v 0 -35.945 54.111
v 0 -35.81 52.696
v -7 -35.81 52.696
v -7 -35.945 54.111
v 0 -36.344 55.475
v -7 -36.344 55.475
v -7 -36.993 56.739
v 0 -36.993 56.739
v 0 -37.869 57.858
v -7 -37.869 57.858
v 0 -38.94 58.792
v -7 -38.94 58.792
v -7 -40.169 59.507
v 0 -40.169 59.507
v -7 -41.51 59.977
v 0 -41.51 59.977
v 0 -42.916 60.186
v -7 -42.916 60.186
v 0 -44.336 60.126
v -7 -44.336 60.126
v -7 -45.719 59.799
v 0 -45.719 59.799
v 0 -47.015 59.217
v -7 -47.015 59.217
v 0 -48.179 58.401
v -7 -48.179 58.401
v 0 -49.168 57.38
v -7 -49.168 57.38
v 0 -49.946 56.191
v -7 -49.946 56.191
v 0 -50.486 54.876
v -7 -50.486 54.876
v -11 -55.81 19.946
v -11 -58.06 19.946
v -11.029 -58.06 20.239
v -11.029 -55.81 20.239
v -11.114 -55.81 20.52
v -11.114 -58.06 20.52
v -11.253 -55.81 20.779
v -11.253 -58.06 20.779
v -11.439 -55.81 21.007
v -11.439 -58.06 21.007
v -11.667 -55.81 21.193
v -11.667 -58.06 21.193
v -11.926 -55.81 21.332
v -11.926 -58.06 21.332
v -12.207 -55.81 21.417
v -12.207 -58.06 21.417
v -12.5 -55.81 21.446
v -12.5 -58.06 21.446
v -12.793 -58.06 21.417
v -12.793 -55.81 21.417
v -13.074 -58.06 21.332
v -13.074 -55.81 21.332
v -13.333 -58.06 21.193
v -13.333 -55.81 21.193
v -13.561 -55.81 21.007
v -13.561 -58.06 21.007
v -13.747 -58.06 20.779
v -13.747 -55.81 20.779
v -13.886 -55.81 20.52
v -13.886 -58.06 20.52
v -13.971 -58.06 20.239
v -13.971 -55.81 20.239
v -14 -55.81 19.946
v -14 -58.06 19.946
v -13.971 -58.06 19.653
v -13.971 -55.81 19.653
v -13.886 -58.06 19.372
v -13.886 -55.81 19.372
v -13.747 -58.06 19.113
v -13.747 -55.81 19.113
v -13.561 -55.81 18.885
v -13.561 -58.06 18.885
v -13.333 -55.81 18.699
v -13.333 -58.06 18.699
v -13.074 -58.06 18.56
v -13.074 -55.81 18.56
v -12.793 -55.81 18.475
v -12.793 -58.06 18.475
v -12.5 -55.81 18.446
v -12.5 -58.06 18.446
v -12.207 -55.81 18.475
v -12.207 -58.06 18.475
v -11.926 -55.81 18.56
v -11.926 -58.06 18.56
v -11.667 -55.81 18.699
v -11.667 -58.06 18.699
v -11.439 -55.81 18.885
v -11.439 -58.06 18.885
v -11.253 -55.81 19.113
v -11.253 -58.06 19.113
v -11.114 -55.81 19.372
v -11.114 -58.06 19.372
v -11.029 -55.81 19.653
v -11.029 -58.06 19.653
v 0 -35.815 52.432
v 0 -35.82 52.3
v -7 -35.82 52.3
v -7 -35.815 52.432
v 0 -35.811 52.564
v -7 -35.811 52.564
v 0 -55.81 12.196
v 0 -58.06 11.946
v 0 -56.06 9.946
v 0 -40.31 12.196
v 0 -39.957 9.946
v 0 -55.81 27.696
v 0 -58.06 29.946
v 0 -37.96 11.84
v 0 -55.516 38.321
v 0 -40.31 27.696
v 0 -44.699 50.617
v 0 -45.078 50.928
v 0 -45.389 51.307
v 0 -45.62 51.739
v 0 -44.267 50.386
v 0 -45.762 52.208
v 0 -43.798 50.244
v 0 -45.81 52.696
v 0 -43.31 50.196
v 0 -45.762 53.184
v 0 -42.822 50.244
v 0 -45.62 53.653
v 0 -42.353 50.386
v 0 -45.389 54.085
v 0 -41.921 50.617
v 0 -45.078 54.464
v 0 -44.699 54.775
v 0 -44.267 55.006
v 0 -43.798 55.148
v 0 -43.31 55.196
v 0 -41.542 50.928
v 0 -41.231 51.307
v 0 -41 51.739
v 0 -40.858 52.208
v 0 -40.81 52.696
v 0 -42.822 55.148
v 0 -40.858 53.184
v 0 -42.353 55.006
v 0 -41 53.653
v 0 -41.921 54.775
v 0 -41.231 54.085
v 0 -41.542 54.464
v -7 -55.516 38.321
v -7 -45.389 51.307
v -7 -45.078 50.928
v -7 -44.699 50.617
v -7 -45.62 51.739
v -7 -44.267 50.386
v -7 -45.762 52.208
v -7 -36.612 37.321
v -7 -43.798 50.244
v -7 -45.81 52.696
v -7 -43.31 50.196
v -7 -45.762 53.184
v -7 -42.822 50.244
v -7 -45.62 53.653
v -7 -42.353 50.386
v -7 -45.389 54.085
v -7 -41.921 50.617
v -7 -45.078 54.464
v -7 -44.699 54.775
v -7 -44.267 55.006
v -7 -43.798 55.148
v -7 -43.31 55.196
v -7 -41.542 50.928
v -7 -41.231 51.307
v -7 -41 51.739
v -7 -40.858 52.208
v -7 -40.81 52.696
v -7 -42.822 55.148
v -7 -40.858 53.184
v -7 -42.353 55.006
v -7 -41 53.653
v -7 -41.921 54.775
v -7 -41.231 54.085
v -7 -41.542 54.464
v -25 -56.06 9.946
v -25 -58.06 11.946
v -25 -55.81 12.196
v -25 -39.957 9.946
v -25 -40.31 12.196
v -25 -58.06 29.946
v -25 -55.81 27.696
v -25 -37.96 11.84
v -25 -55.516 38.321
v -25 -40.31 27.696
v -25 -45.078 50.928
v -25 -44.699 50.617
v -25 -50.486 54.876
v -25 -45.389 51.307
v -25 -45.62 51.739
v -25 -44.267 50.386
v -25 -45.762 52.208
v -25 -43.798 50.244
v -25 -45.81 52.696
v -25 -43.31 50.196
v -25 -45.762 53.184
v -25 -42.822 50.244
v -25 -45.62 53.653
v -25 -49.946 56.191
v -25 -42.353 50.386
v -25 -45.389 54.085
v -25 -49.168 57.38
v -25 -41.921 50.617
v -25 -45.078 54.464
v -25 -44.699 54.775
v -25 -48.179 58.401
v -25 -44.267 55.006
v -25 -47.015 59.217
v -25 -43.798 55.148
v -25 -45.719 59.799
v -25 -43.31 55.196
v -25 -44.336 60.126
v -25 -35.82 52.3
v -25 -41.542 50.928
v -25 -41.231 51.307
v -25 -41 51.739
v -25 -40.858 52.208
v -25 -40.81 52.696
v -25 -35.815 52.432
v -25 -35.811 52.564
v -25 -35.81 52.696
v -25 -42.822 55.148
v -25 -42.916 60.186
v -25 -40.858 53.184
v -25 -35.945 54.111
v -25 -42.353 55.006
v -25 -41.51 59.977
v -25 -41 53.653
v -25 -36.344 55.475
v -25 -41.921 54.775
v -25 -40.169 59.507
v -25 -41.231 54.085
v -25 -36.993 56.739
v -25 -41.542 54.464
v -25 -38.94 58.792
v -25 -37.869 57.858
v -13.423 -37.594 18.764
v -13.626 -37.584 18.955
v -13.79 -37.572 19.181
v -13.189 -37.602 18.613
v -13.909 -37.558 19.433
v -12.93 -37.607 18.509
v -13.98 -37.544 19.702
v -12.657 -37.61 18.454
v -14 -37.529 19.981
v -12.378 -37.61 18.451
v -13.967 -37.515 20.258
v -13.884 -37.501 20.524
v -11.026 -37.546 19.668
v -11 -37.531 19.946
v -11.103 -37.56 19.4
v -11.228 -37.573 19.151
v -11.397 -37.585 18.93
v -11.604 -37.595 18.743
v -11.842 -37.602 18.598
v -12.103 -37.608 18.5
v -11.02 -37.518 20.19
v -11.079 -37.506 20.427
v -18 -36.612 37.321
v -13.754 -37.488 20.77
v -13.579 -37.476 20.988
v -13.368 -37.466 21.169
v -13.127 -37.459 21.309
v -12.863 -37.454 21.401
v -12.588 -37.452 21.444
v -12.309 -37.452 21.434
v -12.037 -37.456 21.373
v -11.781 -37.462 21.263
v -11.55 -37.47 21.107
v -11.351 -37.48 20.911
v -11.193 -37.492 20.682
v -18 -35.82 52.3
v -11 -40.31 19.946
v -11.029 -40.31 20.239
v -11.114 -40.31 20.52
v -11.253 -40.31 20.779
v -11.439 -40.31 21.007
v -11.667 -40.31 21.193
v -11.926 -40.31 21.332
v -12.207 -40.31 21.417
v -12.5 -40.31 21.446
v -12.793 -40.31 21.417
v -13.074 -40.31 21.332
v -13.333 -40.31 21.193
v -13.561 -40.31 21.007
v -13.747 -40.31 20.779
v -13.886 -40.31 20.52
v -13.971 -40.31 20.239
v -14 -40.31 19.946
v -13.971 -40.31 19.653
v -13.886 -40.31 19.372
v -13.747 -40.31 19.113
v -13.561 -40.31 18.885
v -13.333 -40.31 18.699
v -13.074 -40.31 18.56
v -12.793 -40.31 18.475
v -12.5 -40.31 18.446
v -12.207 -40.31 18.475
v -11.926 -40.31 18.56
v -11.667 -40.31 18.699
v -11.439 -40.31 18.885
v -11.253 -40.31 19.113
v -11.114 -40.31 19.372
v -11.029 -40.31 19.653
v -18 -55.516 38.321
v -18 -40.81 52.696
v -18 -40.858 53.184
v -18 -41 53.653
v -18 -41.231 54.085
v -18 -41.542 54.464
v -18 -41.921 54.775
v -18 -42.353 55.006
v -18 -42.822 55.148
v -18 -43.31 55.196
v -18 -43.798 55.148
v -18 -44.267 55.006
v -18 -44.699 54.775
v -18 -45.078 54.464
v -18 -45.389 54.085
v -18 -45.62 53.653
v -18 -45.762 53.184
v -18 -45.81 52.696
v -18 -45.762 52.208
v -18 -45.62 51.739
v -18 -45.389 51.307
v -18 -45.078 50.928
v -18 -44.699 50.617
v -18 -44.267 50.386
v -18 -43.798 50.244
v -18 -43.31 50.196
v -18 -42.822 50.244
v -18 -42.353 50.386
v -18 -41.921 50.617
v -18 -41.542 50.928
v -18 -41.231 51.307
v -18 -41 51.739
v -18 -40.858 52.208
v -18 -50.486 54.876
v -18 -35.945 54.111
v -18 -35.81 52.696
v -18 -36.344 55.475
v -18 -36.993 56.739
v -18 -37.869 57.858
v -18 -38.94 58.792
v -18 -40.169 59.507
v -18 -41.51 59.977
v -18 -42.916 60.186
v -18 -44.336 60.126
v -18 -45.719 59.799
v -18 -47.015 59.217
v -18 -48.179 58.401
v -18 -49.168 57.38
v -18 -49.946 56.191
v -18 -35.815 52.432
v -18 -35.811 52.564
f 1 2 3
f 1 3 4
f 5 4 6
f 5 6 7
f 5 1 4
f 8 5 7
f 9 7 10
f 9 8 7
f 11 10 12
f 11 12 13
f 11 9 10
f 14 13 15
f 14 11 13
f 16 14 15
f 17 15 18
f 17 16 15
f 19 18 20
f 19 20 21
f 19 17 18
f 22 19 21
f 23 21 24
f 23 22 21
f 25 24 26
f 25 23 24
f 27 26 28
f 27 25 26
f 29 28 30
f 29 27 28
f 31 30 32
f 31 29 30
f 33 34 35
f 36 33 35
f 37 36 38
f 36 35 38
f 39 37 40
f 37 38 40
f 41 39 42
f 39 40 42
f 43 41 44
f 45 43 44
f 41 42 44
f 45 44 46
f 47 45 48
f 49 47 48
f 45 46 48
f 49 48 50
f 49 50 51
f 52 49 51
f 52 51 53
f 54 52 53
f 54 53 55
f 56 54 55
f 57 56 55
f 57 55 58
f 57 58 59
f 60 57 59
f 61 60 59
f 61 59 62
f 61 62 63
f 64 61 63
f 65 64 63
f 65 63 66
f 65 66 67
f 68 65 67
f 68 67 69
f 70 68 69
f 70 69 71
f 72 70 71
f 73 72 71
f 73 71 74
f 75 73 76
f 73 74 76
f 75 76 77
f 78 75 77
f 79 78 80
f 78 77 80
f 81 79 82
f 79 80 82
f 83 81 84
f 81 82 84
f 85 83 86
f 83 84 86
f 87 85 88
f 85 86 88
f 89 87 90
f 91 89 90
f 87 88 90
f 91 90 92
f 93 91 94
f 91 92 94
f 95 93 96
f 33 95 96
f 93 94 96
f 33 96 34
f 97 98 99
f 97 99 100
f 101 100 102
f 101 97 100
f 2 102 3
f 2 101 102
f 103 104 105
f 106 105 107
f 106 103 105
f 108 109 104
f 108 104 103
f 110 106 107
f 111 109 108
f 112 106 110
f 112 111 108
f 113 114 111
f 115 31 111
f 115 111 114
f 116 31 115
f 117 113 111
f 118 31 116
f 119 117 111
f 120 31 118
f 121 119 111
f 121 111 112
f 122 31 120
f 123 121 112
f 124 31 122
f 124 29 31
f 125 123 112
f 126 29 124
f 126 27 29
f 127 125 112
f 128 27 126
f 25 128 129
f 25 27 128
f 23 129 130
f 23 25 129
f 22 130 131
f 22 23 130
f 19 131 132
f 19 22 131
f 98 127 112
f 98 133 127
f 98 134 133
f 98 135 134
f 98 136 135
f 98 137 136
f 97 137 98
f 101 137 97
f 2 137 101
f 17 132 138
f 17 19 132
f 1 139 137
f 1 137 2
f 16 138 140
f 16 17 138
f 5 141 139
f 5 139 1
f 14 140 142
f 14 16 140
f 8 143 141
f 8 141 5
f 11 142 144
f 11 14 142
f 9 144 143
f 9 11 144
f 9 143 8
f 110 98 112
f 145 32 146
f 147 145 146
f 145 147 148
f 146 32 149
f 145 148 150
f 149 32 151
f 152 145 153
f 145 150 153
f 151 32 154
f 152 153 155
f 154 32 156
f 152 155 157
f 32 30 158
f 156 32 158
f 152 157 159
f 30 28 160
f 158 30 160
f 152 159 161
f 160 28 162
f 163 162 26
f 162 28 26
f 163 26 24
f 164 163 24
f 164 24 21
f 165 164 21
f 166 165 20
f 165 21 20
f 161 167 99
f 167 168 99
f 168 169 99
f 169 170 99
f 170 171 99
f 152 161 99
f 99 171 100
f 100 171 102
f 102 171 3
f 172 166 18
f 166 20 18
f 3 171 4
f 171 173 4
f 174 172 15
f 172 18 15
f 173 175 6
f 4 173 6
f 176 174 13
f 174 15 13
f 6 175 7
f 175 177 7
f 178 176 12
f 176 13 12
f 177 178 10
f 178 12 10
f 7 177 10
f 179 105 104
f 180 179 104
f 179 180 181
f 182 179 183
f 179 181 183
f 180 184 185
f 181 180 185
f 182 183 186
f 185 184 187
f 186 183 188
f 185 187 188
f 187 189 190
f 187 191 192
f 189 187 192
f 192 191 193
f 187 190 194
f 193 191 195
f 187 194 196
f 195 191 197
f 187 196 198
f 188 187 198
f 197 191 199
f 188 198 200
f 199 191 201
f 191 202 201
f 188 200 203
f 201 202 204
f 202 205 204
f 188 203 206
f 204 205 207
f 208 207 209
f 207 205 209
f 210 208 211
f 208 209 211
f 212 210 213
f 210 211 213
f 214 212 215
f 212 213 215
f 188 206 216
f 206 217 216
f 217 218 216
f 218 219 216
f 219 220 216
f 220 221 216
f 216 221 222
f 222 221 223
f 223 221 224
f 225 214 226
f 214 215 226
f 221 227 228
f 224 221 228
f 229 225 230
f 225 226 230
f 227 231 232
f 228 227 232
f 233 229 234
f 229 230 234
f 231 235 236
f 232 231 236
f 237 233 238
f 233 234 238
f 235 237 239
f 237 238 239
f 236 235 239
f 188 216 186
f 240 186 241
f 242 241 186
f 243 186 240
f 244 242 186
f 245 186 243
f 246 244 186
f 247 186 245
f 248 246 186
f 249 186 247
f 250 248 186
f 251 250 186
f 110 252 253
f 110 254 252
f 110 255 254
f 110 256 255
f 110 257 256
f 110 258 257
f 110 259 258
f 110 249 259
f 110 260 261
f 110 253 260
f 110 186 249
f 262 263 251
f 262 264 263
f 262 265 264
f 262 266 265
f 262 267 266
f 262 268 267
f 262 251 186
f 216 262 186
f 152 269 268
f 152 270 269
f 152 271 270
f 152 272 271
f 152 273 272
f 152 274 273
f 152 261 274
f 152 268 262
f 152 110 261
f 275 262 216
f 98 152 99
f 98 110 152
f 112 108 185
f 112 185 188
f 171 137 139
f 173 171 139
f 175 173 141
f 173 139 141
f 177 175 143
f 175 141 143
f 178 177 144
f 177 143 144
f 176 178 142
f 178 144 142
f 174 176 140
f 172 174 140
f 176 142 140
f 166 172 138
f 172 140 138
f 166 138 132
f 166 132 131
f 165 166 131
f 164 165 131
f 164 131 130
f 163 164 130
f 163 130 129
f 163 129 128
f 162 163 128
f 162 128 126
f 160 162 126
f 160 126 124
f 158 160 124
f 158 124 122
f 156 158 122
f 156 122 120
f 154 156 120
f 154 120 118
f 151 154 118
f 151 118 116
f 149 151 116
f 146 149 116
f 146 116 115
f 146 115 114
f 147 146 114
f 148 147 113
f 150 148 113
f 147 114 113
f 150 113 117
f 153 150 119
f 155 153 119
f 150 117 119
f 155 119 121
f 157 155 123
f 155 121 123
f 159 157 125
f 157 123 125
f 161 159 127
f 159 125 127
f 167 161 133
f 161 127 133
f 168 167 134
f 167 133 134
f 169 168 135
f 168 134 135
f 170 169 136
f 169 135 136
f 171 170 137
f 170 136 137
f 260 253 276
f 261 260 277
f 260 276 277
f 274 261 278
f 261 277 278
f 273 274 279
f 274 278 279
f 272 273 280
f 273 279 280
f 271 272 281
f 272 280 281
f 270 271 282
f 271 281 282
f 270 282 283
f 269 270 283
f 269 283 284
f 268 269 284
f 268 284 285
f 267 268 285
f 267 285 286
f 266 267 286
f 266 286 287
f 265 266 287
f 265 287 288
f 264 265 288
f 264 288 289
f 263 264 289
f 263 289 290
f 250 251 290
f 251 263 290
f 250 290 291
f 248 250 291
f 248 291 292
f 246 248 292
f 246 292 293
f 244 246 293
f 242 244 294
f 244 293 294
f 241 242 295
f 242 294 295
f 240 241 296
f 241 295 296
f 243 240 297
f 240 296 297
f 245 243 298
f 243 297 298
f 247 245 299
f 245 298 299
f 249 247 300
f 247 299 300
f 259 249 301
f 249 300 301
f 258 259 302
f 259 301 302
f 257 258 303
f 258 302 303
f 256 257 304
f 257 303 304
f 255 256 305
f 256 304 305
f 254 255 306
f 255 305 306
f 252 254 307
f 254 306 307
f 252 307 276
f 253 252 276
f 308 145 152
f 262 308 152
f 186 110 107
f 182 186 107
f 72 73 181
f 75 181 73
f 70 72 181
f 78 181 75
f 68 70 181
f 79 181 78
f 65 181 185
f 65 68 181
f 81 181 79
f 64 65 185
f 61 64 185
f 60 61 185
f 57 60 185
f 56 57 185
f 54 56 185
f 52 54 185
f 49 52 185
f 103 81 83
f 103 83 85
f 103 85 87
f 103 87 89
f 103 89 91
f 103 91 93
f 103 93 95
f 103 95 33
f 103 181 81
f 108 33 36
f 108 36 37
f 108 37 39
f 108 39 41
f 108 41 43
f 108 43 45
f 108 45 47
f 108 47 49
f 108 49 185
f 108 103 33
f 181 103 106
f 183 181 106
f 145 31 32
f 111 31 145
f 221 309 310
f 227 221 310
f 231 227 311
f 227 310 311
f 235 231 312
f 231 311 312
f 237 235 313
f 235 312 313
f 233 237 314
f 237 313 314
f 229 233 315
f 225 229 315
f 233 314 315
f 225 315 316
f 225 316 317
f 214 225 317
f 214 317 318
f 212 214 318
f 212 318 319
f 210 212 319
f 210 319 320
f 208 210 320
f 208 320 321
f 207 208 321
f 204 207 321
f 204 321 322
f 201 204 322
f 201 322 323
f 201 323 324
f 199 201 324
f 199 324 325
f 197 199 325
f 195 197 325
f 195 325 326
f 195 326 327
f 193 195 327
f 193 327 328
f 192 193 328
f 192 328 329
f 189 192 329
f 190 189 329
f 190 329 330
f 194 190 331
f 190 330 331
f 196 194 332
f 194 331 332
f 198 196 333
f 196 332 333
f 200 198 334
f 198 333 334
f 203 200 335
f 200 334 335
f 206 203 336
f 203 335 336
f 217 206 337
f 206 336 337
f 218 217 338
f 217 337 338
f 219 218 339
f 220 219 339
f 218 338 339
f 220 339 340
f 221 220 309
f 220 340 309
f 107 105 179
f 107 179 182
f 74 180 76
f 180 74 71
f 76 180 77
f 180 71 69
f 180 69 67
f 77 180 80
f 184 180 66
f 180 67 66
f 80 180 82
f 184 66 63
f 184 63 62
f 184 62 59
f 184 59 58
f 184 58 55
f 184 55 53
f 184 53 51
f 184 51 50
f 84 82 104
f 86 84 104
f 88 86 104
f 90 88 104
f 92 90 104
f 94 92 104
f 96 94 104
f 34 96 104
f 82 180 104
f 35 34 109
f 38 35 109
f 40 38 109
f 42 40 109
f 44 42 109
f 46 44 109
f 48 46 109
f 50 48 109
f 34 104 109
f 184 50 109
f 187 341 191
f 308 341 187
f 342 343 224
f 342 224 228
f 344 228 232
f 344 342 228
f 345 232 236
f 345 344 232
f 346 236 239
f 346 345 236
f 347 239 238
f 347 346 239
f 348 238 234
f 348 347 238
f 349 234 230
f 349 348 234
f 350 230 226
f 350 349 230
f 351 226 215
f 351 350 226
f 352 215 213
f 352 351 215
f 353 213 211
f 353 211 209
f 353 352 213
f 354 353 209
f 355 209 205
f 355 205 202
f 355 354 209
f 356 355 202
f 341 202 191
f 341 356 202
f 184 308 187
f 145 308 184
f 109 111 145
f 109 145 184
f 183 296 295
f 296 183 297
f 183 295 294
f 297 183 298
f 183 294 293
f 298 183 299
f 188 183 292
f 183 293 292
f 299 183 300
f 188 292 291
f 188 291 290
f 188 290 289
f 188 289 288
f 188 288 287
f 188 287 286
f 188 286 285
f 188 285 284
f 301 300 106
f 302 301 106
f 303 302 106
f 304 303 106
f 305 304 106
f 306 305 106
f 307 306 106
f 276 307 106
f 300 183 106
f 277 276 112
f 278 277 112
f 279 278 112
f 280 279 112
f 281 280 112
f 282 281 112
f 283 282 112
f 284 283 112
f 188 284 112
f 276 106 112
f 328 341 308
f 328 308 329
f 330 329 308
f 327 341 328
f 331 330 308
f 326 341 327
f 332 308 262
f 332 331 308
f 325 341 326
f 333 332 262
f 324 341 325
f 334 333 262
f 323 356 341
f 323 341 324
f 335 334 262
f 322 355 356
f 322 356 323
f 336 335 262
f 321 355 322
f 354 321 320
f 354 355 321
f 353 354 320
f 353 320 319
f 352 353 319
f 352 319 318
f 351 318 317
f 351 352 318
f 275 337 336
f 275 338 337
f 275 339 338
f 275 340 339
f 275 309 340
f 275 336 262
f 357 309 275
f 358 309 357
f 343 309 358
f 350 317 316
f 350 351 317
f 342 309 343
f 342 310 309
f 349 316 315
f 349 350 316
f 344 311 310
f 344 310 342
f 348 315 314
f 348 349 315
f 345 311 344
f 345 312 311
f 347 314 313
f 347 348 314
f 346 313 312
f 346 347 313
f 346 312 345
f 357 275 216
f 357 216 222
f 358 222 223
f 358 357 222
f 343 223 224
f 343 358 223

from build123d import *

# Parameters (mm, degrees)
F0_R        = 2.5
F0_W        = 20
F0_H        = 20
F0_W_2      = 15.5
F0_H_2      = 15.5
F1_DEPTH    = 25
F2_START    = -7
F2_DEPTH    = 11
F3_R        = 1.5
F4_DEPTH    = 25
F5_T1_DEPTH = 35.2867319519
F5_T3_DEPTH = 34.7792924718


# Not quite as in the source:
# - a fillet or chamfer that OpenCascade refuses, or shapes differently, is made with other operations: its cross-section is extruded or revolved along the edge and cut away or added


with BuildPart() as f1:
    # F0 (on Right) → F1 (new body)
    with BuildSketch(Plane.YZ):
        Polygon((-55.5157013459, 38.3205534184), (-58.0598865449, 29.9461055547), (-38.0598865449, 29.9461055547), (-38.0598865449, 9.9461055547), (-36.6123928978, 37.3210094949), align=None)
        with BuildLine():
            ThreePointArc((-35.8098865449, 52.6961055547), (-42.207857033, 60.1146991515), (-50.4860281329, 54.8762413095))
            ThreePointArc((-50.4860281329, 54.8762413095), (-44.6074616185, 45.3092050593), (-35.8203493916, 52.3000838016))
            ThreePointArc((-35.8203493916, 52.3000838016), (-35.8125027129, 52.4980255834), (-35.8098865449, 52.6961055547))
        make_face()
        with Locations((-43.3098865449, 52.6961055547)):
            Circle(F0_R, mode=Mode.SUBTRACT)
        with Locations((-48.0598865449, 19.9461055547)):
            Rectangle(F0_W, F0_H)
        with Locations((-48.0598865449, 19.9461055547)):
            Rectangle(F0_W_2, F0_H_2, mode=Mode.SUBTRACT)
        with BuildLine():
            Line((-50.4860281329, 54.8762413095), (-55.5157013459, 38.3205534184))
            Line((-55.5157013459, 38.3205534184), (-36.6123928978, 37.3210094949))
            Line((-36.6123928978, 37.3210094949), (-35.8203493916, 52.3000838016))
            ThreePointArc((-35.8203493916, 52.3000838016), (-44.6074616185, 45.3092050593), (-50.4860281329, 54.8762413095))
        make_face()
    extrude(amount=-F1_DEPTH)

    # F0 (on Right) → F2 (cut)
    with BuildSketch(Plane.YZ.offset(F2_START)):
        with BuildLine():
            Line((-50.4860281329, 54.8762413095), (-55.5157013459, 38.3205534184))
            Line((-55.5157013459, 38.3205534184), (-36.6123928978, 37.3210094949))
            Line((-36.6123928978, 37.3210094949), (-35.8203493916, 52.3000838016))
            ThreePointArc((-35.8203493916, 52.3000838016), (-44.6074616185, 45.3092050593), (-50.4860281329, 54.8762413095))
        make_face()
        with BuildLine():
            ThreePointArc((-35.8098865449, 52.6961055547), (-42.207857033, 60.1146991515), (-50.4860281329, 54.8762413095))
            ThreePointArc((-50.4860281329, 54.8762413095), (-44.6074616185, 45.3092050593), (-35.8203493916, 52.3000838016))
            ThreePointArc((-35.8203493916, 52.3000838016), (-35.8125027129, 52.4980255834), (-35.8098865449, 52.6961055547))
        make_face()
        with Locations((-43.3098865449, 52.6961055547)):
            Circle(F0_R, mode=Mode.SUBTRACT)
    extrude(amount=-F2_DEPTH, mode=Mode.SUBTRACT)

    # F3 (on face) → F4 (cut)
    with BuildSketch(Plane.XZ.offset(58.0598865449)):
        with Locations((-12.5, 19.9461055547)):
            Circle(F3_R)
    extrude(amount=-F4_DEPTH, mode=Mode.SUBTRACT)

    # F5: chamfer of 2 on 2 edges, made by hand

    # F5_s2 → F5_t1 (cut)
    with BuildSketch(Plane.YZ.offset(-30.1433659759)):
        Polygon((-56.0598865449, 9.9461055547), (-58.0598865449, 11.9461055547), (-58.0598865449, 9.9461055547), align=None)
    extrude(amount=F5_T1_DEPTH, mode=Mode.SUBTRACT)

    # F5_s4 → F5_t3 (cut)
    with BuildSketch(Plane.YZ.offset(-29.8896462359)):
        Polygon((-37.959717296, 11.8404997539), (-39.9569272035, 9.9461055547), (-38.0598865449, 9.9461055547), align=None)
    extrude(amount=F5_T3_DEPTH, mode=Mode.SUBTRACT)


solid = f1.part
